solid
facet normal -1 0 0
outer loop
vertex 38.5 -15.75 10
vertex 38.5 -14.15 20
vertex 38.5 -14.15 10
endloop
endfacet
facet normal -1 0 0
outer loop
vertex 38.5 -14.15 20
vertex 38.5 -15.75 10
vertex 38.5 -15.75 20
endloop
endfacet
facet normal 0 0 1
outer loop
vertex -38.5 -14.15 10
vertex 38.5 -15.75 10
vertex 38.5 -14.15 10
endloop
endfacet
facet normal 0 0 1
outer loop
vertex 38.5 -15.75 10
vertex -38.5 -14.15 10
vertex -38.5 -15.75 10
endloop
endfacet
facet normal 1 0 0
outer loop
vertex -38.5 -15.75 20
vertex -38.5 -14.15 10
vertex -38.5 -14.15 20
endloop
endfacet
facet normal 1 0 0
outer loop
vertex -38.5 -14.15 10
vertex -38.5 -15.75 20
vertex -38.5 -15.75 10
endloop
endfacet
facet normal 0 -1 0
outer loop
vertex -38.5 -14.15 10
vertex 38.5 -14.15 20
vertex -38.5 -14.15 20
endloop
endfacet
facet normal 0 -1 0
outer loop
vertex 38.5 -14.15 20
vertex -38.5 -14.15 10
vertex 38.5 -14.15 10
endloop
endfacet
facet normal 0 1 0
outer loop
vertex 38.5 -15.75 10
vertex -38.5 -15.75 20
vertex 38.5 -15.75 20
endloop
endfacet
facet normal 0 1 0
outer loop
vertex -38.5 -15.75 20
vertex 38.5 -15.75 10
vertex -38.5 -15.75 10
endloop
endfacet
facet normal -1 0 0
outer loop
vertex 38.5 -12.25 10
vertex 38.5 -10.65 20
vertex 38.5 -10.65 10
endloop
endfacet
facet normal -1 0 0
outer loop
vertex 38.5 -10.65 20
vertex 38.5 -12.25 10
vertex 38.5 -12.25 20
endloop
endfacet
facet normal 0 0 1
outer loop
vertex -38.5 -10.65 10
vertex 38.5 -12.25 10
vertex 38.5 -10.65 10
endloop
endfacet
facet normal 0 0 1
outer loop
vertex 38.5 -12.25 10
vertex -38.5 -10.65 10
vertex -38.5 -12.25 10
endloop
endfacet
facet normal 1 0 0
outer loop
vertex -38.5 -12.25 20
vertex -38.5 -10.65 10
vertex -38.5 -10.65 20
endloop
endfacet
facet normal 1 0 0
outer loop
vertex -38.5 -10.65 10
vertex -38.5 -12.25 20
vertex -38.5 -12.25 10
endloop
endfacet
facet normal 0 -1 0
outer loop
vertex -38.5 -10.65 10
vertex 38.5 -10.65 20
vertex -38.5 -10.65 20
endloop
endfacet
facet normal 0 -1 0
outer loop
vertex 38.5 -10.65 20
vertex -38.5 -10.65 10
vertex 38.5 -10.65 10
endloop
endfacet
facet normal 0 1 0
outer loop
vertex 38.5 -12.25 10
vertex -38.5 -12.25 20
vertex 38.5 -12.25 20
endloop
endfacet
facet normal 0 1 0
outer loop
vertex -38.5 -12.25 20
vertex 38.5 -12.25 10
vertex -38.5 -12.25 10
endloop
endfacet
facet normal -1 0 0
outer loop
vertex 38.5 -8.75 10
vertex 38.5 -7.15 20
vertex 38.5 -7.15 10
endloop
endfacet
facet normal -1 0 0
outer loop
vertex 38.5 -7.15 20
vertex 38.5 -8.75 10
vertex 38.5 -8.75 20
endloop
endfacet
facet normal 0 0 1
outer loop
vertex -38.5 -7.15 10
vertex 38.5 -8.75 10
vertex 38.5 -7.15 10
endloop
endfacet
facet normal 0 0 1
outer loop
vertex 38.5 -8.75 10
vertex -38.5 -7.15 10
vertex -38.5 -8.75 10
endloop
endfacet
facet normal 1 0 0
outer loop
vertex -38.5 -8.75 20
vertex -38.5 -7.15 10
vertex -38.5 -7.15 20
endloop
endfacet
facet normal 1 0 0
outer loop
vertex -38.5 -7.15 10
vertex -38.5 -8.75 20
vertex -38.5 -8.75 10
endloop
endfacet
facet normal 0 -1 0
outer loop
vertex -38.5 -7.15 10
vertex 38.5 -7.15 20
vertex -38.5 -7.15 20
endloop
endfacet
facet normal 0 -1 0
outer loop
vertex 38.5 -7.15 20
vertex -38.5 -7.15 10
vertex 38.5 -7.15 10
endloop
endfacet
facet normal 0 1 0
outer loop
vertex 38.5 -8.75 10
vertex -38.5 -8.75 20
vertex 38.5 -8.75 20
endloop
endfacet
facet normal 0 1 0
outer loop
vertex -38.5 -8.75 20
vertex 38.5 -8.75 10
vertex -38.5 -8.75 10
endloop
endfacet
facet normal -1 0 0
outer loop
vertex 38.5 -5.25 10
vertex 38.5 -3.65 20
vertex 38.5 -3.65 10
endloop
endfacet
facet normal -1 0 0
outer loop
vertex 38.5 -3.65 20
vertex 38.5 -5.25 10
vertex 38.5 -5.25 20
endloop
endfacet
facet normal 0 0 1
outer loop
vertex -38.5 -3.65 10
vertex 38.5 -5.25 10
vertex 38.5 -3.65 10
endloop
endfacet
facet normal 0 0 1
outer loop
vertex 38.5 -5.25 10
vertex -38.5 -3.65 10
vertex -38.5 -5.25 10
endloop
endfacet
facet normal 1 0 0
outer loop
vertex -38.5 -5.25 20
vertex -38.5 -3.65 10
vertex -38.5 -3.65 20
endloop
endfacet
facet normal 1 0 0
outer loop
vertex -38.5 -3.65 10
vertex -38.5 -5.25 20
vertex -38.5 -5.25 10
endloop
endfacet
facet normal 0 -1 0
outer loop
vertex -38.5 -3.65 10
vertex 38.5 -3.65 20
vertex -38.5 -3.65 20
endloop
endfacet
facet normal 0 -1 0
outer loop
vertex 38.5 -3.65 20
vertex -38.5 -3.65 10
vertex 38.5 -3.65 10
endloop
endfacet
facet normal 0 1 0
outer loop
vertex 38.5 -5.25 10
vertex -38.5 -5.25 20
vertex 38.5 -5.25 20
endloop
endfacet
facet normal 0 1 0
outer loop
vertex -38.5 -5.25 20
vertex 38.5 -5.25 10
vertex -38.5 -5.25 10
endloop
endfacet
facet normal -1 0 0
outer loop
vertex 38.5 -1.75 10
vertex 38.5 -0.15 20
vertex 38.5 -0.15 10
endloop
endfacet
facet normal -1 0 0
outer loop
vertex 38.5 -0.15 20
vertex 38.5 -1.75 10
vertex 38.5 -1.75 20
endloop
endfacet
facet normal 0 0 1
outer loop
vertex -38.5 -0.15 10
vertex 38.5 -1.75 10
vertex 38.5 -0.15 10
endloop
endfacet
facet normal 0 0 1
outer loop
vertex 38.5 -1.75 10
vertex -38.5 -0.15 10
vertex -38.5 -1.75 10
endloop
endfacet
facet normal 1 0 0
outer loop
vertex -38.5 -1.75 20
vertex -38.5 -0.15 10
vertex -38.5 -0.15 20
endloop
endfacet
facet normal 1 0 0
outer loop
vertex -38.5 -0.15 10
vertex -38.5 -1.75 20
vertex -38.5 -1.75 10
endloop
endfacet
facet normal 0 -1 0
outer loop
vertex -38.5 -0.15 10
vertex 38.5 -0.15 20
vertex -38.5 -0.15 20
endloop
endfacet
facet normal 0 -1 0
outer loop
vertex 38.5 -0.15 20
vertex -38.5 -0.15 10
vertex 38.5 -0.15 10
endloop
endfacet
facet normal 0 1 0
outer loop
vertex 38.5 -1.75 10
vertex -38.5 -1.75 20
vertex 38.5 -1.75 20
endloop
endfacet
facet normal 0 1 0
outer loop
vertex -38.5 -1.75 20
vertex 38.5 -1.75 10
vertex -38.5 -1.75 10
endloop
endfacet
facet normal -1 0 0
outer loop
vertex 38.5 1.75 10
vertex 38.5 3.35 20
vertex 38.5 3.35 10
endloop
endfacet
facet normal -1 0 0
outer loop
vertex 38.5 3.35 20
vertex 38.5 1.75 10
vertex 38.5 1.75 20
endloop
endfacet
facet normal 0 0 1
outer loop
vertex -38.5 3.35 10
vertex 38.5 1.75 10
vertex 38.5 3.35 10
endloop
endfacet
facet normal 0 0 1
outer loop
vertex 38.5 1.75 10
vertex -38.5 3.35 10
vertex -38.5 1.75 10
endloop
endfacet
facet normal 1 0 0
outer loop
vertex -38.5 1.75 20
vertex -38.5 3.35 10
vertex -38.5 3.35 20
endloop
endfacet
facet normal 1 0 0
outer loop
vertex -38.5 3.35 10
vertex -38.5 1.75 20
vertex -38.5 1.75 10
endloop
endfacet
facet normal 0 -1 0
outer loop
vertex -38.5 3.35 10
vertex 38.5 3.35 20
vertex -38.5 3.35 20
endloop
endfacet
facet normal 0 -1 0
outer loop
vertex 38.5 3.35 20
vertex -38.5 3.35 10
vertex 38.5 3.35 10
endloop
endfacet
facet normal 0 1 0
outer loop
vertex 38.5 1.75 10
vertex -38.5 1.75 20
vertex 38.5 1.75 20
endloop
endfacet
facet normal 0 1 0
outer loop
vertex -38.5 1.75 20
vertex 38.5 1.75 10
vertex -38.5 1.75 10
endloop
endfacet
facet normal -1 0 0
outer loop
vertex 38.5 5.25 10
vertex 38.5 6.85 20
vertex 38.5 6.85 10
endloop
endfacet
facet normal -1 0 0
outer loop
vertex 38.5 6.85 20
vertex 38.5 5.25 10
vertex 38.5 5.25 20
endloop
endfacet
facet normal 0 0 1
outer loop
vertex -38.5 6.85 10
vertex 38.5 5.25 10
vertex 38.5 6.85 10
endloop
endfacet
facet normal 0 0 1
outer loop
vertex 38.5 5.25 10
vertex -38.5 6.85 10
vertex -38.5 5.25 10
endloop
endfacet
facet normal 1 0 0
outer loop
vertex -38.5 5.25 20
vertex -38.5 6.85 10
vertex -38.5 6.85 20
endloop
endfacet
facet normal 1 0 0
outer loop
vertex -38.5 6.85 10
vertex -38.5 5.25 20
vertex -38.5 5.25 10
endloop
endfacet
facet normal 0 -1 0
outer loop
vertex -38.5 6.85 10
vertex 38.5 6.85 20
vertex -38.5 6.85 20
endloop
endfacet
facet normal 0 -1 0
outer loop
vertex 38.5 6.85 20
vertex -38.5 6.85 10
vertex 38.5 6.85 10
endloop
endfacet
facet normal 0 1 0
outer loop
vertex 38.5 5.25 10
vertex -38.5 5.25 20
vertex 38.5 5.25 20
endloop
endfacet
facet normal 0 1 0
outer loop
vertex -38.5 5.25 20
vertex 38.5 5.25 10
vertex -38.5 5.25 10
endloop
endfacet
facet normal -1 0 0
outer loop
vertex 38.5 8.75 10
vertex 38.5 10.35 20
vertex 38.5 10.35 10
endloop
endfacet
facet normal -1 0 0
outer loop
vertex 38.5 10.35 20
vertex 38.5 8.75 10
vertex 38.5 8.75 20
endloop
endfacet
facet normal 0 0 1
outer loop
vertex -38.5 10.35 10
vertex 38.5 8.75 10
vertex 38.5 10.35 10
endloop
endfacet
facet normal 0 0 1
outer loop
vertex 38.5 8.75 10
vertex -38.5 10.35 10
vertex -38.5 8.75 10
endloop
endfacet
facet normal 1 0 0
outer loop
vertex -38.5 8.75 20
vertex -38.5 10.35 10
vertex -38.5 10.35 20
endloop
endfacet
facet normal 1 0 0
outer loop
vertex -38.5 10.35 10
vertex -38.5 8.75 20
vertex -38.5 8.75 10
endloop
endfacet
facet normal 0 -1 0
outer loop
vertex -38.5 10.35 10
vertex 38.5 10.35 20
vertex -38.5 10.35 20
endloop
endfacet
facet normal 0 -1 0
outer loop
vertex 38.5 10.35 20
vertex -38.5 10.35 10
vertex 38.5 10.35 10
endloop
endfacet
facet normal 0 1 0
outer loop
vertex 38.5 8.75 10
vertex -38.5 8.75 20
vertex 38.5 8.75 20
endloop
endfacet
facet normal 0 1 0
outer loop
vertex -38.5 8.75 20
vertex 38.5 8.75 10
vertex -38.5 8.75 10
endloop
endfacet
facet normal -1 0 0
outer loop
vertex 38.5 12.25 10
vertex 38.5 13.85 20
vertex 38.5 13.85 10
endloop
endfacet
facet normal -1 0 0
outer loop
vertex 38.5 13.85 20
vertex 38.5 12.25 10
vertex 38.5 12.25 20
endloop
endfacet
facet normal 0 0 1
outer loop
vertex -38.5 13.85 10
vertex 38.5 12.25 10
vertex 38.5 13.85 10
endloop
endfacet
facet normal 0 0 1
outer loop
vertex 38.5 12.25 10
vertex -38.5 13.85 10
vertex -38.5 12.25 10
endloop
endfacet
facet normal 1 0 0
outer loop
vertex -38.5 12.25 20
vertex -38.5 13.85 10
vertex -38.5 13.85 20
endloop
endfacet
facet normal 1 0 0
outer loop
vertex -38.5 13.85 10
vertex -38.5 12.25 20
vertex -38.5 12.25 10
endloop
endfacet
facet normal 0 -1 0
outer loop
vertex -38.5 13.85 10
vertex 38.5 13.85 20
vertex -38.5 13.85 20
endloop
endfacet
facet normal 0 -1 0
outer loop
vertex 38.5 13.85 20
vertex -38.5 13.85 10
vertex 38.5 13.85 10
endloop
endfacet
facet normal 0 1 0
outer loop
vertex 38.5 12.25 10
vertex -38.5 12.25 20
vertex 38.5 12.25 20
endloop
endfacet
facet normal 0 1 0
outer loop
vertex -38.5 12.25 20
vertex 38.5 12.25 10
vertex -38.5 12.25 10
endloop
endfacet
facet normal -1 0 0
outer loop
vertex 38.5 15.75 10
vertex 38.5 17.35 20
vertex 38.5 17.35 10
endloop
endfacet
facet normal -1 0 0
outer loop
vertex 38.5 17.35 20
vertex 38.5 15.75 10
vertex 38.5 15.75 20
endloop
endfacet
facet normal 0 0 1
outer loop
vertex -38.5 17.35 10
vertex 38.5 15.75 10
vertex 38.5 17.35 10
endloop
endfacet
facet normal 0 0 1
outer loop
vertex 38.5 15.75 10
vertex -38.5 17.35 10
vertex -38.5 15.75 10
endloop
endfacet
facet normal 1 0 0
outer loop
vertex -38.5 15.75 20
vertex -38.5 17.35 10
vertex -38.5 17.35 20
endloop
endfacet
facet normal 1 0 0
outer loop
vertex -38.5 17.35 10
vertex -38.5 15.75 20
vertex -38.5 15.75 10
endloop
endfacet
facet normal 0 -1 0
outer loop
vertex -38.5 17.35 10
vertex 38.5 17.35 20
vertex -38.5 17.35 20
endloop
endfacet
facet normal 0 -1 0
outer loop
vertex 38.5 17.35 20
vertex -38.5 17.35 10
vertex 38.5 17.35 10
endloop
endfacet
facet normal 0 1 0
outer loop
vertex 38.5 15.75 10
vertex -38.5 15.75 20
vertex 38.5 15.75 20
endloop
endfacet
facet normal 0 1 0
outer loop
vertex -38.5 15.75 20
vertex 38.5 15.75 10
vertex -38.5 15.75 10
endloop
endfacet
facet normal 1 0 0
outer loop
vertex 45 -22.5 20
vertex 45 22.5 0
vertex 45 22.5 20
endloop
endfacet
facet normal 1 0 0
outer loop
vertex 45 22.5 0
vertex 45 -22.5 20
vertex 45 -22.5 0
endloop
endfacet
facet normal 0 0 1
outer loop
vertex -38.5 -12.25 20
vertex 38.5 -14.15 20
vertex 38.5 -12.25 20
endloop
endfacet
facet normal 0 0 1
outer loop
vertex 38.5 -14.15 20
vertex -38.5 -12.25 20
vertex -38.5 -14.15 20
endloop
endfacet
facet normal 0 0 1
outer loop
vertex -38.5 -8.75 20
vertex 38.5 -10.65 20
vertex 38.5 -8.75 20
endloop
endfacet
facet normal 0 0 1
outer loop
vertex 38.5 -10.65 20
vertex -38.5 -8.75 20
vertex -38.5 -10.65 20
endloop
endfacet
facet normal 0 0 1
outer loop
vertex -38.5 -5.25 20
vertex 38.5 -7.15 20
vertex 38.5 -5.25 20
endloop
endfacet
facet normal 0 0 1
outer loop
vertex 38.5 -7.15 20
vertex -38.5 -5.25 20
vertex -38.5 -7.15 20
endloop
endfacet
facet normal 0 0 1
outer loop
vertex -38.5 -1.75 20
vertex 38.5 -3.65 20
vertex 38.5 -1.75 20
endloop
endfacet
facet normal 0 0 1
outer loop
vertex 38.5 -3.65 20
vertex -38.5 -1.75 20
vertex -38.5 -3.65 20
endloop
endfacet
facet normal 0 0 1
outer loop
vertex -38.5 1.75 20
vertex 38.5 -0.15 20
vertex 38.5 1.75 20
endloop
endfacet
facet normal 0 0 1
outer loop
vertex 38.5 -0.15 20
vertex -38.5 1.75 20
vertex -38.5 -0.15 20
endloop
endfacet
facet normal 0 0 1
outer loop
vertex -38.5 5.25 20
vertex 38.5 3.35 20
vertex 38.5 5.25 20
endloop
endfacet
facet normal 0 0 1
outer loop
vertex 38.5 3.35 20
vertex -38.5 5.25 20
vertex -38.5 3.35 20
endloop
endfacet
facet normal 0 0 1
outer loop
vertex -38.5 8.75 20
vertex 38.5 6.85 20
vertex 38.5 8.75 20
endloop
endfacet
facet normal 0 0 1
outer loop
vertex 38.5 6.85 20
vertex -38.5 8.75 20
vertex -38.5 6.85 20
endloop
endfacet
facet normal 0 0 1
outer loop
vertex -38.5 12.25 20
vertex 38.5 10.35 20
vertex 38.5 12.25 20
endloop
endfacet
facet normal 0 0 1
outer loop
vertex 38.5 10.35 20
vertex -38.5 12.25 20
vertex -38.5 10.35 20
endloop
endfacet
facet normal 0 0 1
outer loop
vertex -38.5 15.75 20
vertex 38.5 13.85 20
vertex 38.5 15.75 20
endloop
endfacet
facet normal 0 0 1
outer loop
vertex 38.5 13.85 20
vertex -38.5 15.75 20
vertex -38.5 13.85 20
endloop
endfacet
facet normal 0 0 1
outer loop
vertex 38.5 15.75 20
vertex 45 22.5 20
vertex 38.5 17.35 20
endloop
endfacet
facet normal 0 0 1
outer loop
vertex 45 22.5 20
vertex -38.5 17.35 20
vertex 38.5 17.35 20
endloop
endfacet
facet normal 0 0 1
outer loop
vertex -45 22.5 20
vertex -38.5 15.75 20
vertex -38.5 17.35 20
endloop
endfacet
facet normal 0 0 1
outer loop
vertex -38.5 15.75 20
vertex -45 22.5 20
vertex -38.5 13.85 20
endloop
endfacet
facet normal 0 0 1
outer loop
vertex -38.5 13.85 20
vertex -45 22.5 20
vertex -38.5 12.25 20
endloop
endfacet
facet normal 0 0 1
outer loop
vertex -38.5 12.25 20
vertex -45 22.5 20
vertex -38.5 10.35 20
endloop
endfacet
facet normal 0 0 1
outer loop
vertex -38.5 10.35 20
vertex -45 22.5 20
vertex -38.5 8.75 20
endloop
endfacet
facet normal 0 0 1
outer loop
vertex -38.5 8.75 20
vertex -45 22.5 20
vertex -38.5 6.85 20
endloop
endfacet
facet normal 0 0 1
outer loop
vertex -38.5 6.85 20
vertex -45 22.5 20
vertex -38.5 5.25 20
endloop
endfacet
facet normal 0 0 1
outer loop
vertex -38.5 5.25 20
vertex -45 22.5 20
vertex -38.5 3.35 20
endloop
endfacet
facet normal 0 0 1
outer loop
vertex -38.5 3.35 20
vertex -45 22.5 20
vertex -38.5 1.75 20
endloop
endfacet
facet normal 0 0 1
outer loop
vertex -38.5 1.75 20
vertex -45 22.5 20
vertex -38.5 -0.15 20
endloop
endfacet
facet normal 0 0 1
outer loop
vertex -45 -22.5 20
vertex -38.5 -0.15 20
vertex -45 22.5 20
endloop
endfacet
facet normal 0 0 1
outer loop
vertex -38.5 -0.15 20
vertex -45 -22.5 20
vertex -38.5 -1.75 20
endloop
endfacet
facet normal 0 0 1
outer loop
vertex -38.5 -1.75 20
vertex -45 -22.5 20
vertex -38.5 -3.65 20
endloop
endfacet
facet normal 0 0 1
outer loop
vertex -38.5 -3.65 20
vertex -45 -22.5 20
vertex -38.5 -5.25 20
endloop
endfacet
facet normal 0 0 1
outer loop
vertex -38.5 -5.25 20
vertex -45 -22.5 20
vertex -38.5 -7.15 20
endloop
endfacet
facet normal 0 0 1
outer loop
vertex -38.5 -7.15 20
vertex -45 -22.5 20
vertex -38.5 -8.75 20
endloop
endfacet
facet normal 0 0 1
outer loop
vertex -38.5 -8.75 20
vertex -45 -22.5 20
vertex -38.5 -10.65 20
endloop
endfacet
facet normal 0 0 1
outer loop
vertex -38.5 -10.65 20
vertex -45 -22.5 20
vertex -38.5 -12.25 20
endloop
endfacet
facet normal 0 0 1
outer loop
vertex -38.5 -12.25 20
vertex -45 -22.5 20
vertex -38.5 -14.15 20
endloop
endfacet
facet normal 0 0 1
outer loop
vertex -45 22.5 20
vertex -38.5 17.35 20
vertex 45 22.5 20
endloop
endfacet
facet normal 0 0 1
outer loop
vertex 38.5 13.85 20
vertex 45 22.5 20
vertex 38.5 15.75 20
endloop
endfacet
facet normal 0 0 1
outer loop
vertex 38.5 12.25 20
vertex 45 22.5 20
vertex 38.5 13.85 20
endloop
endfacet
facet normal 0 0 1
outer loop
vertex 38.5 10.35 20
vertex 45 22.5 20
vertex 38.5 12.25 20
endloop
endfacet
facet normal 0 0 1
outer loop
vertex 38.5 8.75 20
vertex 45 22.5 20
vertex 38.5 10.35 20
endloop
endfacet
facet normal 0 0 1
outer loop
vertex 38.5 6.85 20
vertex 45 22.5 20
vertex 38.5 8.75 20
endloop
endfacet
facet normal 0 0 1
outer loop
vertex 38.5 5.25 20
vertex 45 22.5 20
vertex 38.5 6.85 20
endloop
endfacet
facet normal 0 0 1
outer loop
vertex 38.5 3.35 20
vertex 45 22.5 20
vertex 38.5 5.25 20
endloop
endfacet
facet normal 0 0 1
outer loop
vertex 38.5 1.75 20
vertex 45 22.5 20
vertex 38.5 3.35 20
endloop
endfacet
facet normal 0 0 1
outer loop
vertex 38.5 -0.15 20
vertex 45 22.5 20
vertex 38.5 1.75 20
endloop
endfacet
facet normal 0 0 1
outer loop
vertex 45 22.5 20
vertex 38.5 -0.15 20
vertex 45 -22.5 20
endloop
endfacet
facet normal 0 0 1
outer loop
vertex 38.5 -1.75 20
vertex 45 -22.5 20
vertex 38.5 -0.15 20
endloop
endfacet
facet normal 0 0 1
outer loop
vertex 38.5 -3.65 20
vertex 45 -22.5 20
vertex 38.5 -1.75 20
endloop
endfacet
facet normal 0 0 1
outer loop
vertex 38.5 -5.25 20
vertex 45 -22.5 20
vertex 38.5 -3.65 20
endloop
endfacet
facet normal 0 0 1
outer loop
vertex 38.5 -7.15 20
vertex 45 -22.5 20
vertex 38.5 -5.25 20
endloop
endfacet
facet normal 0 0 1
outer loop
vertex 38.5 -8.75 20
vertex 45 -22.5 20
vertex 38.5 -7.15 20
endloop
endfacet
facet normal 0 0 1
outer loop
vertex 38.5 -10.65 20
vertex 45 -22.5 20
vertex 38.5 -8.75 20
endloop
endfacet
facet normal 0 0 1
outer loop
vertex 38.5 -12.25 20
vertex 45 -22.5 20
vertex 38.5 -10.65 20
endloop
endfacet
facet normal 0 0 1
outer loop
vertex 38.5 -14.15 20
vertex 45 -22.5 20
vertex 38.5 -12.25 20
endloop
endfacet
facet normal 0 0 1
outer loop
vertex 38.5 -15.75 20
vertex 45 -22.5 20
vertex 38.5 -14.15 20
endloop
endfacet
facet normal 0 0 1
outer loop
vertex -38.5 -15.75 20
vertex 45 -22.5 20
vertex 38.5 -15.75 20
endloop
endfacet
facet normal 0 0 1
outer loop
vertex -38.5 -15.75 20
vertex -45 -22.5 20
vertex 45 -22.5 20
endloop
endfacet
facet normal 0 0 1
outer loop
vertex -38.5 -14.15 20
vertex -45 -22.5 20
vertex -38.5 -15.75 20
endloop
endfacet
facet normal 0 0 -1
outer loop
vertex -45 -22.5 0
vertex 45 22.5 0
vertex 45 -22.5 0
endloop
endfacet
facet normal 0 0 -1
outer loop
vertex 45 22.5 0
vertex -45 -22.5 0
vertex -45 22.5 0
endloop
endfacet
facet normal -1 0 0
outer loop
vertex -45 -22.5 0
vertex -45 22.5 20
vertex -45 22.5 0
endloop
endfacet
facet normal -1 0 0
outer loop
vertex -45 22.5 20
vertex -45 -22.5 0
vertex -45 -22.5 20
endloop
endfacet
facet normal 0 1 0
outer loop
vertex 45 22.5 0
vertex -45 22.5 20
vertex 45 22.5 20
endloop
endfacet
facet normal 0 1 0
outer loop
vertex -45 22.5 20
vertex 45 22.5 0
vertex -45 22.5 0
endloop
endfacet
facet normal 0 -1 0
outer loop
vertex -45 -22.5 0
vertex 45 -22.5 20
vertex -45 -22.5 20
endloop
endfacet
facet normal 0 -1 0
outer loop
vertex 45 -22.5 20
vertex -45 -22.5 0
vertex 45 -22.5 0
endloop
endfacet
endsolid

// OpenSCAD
// Slide drying rack - holds 10 microscope slides upright on their long edge
// Print orientation: base block on the bed (z = 0), slots open upward (+Z)

// ---------------- Parameters ----------------
block_len    = 90;    // base block length along X (mm)
block_wid    = 45;    // base block width along Y (mm)
block_ht     = 20;    // base block height along Z (mm)

slot_len     = 77;    // slot length along X (mm)
slot_w       = 1.6;   // slot width along Y (mm)
slot_depth   = 10;    // slot depth from top face (mm)
slot_pitch   = 3.5;   // centre-to-centre spacing of slots in Y (mm)
slot_count   = 10;    // number of slide slots

eps          = 0.5;   // overshoot so cutters pass through the top face (mm)

$fn = 64;

// ---------------- Model ----------------
difference() {
    // Base block, centred in X and Y, sitting on z = 0
    translate([-block_len/2, -block_wid/2, 0])
        cube([block_len, block_wid, block_ht]);

    // Row of parallel slots, centred on the block in X and Y
    for (i = [0 : slot_count - 1]) {
        y = (i - (slot_count - 1)/2) * slot_pitch;
        translate([-slot_len/2, y, block_ht - slot_depth])
            cube([slot_len, slot_w, slot_depth + eps]);
    }
}
